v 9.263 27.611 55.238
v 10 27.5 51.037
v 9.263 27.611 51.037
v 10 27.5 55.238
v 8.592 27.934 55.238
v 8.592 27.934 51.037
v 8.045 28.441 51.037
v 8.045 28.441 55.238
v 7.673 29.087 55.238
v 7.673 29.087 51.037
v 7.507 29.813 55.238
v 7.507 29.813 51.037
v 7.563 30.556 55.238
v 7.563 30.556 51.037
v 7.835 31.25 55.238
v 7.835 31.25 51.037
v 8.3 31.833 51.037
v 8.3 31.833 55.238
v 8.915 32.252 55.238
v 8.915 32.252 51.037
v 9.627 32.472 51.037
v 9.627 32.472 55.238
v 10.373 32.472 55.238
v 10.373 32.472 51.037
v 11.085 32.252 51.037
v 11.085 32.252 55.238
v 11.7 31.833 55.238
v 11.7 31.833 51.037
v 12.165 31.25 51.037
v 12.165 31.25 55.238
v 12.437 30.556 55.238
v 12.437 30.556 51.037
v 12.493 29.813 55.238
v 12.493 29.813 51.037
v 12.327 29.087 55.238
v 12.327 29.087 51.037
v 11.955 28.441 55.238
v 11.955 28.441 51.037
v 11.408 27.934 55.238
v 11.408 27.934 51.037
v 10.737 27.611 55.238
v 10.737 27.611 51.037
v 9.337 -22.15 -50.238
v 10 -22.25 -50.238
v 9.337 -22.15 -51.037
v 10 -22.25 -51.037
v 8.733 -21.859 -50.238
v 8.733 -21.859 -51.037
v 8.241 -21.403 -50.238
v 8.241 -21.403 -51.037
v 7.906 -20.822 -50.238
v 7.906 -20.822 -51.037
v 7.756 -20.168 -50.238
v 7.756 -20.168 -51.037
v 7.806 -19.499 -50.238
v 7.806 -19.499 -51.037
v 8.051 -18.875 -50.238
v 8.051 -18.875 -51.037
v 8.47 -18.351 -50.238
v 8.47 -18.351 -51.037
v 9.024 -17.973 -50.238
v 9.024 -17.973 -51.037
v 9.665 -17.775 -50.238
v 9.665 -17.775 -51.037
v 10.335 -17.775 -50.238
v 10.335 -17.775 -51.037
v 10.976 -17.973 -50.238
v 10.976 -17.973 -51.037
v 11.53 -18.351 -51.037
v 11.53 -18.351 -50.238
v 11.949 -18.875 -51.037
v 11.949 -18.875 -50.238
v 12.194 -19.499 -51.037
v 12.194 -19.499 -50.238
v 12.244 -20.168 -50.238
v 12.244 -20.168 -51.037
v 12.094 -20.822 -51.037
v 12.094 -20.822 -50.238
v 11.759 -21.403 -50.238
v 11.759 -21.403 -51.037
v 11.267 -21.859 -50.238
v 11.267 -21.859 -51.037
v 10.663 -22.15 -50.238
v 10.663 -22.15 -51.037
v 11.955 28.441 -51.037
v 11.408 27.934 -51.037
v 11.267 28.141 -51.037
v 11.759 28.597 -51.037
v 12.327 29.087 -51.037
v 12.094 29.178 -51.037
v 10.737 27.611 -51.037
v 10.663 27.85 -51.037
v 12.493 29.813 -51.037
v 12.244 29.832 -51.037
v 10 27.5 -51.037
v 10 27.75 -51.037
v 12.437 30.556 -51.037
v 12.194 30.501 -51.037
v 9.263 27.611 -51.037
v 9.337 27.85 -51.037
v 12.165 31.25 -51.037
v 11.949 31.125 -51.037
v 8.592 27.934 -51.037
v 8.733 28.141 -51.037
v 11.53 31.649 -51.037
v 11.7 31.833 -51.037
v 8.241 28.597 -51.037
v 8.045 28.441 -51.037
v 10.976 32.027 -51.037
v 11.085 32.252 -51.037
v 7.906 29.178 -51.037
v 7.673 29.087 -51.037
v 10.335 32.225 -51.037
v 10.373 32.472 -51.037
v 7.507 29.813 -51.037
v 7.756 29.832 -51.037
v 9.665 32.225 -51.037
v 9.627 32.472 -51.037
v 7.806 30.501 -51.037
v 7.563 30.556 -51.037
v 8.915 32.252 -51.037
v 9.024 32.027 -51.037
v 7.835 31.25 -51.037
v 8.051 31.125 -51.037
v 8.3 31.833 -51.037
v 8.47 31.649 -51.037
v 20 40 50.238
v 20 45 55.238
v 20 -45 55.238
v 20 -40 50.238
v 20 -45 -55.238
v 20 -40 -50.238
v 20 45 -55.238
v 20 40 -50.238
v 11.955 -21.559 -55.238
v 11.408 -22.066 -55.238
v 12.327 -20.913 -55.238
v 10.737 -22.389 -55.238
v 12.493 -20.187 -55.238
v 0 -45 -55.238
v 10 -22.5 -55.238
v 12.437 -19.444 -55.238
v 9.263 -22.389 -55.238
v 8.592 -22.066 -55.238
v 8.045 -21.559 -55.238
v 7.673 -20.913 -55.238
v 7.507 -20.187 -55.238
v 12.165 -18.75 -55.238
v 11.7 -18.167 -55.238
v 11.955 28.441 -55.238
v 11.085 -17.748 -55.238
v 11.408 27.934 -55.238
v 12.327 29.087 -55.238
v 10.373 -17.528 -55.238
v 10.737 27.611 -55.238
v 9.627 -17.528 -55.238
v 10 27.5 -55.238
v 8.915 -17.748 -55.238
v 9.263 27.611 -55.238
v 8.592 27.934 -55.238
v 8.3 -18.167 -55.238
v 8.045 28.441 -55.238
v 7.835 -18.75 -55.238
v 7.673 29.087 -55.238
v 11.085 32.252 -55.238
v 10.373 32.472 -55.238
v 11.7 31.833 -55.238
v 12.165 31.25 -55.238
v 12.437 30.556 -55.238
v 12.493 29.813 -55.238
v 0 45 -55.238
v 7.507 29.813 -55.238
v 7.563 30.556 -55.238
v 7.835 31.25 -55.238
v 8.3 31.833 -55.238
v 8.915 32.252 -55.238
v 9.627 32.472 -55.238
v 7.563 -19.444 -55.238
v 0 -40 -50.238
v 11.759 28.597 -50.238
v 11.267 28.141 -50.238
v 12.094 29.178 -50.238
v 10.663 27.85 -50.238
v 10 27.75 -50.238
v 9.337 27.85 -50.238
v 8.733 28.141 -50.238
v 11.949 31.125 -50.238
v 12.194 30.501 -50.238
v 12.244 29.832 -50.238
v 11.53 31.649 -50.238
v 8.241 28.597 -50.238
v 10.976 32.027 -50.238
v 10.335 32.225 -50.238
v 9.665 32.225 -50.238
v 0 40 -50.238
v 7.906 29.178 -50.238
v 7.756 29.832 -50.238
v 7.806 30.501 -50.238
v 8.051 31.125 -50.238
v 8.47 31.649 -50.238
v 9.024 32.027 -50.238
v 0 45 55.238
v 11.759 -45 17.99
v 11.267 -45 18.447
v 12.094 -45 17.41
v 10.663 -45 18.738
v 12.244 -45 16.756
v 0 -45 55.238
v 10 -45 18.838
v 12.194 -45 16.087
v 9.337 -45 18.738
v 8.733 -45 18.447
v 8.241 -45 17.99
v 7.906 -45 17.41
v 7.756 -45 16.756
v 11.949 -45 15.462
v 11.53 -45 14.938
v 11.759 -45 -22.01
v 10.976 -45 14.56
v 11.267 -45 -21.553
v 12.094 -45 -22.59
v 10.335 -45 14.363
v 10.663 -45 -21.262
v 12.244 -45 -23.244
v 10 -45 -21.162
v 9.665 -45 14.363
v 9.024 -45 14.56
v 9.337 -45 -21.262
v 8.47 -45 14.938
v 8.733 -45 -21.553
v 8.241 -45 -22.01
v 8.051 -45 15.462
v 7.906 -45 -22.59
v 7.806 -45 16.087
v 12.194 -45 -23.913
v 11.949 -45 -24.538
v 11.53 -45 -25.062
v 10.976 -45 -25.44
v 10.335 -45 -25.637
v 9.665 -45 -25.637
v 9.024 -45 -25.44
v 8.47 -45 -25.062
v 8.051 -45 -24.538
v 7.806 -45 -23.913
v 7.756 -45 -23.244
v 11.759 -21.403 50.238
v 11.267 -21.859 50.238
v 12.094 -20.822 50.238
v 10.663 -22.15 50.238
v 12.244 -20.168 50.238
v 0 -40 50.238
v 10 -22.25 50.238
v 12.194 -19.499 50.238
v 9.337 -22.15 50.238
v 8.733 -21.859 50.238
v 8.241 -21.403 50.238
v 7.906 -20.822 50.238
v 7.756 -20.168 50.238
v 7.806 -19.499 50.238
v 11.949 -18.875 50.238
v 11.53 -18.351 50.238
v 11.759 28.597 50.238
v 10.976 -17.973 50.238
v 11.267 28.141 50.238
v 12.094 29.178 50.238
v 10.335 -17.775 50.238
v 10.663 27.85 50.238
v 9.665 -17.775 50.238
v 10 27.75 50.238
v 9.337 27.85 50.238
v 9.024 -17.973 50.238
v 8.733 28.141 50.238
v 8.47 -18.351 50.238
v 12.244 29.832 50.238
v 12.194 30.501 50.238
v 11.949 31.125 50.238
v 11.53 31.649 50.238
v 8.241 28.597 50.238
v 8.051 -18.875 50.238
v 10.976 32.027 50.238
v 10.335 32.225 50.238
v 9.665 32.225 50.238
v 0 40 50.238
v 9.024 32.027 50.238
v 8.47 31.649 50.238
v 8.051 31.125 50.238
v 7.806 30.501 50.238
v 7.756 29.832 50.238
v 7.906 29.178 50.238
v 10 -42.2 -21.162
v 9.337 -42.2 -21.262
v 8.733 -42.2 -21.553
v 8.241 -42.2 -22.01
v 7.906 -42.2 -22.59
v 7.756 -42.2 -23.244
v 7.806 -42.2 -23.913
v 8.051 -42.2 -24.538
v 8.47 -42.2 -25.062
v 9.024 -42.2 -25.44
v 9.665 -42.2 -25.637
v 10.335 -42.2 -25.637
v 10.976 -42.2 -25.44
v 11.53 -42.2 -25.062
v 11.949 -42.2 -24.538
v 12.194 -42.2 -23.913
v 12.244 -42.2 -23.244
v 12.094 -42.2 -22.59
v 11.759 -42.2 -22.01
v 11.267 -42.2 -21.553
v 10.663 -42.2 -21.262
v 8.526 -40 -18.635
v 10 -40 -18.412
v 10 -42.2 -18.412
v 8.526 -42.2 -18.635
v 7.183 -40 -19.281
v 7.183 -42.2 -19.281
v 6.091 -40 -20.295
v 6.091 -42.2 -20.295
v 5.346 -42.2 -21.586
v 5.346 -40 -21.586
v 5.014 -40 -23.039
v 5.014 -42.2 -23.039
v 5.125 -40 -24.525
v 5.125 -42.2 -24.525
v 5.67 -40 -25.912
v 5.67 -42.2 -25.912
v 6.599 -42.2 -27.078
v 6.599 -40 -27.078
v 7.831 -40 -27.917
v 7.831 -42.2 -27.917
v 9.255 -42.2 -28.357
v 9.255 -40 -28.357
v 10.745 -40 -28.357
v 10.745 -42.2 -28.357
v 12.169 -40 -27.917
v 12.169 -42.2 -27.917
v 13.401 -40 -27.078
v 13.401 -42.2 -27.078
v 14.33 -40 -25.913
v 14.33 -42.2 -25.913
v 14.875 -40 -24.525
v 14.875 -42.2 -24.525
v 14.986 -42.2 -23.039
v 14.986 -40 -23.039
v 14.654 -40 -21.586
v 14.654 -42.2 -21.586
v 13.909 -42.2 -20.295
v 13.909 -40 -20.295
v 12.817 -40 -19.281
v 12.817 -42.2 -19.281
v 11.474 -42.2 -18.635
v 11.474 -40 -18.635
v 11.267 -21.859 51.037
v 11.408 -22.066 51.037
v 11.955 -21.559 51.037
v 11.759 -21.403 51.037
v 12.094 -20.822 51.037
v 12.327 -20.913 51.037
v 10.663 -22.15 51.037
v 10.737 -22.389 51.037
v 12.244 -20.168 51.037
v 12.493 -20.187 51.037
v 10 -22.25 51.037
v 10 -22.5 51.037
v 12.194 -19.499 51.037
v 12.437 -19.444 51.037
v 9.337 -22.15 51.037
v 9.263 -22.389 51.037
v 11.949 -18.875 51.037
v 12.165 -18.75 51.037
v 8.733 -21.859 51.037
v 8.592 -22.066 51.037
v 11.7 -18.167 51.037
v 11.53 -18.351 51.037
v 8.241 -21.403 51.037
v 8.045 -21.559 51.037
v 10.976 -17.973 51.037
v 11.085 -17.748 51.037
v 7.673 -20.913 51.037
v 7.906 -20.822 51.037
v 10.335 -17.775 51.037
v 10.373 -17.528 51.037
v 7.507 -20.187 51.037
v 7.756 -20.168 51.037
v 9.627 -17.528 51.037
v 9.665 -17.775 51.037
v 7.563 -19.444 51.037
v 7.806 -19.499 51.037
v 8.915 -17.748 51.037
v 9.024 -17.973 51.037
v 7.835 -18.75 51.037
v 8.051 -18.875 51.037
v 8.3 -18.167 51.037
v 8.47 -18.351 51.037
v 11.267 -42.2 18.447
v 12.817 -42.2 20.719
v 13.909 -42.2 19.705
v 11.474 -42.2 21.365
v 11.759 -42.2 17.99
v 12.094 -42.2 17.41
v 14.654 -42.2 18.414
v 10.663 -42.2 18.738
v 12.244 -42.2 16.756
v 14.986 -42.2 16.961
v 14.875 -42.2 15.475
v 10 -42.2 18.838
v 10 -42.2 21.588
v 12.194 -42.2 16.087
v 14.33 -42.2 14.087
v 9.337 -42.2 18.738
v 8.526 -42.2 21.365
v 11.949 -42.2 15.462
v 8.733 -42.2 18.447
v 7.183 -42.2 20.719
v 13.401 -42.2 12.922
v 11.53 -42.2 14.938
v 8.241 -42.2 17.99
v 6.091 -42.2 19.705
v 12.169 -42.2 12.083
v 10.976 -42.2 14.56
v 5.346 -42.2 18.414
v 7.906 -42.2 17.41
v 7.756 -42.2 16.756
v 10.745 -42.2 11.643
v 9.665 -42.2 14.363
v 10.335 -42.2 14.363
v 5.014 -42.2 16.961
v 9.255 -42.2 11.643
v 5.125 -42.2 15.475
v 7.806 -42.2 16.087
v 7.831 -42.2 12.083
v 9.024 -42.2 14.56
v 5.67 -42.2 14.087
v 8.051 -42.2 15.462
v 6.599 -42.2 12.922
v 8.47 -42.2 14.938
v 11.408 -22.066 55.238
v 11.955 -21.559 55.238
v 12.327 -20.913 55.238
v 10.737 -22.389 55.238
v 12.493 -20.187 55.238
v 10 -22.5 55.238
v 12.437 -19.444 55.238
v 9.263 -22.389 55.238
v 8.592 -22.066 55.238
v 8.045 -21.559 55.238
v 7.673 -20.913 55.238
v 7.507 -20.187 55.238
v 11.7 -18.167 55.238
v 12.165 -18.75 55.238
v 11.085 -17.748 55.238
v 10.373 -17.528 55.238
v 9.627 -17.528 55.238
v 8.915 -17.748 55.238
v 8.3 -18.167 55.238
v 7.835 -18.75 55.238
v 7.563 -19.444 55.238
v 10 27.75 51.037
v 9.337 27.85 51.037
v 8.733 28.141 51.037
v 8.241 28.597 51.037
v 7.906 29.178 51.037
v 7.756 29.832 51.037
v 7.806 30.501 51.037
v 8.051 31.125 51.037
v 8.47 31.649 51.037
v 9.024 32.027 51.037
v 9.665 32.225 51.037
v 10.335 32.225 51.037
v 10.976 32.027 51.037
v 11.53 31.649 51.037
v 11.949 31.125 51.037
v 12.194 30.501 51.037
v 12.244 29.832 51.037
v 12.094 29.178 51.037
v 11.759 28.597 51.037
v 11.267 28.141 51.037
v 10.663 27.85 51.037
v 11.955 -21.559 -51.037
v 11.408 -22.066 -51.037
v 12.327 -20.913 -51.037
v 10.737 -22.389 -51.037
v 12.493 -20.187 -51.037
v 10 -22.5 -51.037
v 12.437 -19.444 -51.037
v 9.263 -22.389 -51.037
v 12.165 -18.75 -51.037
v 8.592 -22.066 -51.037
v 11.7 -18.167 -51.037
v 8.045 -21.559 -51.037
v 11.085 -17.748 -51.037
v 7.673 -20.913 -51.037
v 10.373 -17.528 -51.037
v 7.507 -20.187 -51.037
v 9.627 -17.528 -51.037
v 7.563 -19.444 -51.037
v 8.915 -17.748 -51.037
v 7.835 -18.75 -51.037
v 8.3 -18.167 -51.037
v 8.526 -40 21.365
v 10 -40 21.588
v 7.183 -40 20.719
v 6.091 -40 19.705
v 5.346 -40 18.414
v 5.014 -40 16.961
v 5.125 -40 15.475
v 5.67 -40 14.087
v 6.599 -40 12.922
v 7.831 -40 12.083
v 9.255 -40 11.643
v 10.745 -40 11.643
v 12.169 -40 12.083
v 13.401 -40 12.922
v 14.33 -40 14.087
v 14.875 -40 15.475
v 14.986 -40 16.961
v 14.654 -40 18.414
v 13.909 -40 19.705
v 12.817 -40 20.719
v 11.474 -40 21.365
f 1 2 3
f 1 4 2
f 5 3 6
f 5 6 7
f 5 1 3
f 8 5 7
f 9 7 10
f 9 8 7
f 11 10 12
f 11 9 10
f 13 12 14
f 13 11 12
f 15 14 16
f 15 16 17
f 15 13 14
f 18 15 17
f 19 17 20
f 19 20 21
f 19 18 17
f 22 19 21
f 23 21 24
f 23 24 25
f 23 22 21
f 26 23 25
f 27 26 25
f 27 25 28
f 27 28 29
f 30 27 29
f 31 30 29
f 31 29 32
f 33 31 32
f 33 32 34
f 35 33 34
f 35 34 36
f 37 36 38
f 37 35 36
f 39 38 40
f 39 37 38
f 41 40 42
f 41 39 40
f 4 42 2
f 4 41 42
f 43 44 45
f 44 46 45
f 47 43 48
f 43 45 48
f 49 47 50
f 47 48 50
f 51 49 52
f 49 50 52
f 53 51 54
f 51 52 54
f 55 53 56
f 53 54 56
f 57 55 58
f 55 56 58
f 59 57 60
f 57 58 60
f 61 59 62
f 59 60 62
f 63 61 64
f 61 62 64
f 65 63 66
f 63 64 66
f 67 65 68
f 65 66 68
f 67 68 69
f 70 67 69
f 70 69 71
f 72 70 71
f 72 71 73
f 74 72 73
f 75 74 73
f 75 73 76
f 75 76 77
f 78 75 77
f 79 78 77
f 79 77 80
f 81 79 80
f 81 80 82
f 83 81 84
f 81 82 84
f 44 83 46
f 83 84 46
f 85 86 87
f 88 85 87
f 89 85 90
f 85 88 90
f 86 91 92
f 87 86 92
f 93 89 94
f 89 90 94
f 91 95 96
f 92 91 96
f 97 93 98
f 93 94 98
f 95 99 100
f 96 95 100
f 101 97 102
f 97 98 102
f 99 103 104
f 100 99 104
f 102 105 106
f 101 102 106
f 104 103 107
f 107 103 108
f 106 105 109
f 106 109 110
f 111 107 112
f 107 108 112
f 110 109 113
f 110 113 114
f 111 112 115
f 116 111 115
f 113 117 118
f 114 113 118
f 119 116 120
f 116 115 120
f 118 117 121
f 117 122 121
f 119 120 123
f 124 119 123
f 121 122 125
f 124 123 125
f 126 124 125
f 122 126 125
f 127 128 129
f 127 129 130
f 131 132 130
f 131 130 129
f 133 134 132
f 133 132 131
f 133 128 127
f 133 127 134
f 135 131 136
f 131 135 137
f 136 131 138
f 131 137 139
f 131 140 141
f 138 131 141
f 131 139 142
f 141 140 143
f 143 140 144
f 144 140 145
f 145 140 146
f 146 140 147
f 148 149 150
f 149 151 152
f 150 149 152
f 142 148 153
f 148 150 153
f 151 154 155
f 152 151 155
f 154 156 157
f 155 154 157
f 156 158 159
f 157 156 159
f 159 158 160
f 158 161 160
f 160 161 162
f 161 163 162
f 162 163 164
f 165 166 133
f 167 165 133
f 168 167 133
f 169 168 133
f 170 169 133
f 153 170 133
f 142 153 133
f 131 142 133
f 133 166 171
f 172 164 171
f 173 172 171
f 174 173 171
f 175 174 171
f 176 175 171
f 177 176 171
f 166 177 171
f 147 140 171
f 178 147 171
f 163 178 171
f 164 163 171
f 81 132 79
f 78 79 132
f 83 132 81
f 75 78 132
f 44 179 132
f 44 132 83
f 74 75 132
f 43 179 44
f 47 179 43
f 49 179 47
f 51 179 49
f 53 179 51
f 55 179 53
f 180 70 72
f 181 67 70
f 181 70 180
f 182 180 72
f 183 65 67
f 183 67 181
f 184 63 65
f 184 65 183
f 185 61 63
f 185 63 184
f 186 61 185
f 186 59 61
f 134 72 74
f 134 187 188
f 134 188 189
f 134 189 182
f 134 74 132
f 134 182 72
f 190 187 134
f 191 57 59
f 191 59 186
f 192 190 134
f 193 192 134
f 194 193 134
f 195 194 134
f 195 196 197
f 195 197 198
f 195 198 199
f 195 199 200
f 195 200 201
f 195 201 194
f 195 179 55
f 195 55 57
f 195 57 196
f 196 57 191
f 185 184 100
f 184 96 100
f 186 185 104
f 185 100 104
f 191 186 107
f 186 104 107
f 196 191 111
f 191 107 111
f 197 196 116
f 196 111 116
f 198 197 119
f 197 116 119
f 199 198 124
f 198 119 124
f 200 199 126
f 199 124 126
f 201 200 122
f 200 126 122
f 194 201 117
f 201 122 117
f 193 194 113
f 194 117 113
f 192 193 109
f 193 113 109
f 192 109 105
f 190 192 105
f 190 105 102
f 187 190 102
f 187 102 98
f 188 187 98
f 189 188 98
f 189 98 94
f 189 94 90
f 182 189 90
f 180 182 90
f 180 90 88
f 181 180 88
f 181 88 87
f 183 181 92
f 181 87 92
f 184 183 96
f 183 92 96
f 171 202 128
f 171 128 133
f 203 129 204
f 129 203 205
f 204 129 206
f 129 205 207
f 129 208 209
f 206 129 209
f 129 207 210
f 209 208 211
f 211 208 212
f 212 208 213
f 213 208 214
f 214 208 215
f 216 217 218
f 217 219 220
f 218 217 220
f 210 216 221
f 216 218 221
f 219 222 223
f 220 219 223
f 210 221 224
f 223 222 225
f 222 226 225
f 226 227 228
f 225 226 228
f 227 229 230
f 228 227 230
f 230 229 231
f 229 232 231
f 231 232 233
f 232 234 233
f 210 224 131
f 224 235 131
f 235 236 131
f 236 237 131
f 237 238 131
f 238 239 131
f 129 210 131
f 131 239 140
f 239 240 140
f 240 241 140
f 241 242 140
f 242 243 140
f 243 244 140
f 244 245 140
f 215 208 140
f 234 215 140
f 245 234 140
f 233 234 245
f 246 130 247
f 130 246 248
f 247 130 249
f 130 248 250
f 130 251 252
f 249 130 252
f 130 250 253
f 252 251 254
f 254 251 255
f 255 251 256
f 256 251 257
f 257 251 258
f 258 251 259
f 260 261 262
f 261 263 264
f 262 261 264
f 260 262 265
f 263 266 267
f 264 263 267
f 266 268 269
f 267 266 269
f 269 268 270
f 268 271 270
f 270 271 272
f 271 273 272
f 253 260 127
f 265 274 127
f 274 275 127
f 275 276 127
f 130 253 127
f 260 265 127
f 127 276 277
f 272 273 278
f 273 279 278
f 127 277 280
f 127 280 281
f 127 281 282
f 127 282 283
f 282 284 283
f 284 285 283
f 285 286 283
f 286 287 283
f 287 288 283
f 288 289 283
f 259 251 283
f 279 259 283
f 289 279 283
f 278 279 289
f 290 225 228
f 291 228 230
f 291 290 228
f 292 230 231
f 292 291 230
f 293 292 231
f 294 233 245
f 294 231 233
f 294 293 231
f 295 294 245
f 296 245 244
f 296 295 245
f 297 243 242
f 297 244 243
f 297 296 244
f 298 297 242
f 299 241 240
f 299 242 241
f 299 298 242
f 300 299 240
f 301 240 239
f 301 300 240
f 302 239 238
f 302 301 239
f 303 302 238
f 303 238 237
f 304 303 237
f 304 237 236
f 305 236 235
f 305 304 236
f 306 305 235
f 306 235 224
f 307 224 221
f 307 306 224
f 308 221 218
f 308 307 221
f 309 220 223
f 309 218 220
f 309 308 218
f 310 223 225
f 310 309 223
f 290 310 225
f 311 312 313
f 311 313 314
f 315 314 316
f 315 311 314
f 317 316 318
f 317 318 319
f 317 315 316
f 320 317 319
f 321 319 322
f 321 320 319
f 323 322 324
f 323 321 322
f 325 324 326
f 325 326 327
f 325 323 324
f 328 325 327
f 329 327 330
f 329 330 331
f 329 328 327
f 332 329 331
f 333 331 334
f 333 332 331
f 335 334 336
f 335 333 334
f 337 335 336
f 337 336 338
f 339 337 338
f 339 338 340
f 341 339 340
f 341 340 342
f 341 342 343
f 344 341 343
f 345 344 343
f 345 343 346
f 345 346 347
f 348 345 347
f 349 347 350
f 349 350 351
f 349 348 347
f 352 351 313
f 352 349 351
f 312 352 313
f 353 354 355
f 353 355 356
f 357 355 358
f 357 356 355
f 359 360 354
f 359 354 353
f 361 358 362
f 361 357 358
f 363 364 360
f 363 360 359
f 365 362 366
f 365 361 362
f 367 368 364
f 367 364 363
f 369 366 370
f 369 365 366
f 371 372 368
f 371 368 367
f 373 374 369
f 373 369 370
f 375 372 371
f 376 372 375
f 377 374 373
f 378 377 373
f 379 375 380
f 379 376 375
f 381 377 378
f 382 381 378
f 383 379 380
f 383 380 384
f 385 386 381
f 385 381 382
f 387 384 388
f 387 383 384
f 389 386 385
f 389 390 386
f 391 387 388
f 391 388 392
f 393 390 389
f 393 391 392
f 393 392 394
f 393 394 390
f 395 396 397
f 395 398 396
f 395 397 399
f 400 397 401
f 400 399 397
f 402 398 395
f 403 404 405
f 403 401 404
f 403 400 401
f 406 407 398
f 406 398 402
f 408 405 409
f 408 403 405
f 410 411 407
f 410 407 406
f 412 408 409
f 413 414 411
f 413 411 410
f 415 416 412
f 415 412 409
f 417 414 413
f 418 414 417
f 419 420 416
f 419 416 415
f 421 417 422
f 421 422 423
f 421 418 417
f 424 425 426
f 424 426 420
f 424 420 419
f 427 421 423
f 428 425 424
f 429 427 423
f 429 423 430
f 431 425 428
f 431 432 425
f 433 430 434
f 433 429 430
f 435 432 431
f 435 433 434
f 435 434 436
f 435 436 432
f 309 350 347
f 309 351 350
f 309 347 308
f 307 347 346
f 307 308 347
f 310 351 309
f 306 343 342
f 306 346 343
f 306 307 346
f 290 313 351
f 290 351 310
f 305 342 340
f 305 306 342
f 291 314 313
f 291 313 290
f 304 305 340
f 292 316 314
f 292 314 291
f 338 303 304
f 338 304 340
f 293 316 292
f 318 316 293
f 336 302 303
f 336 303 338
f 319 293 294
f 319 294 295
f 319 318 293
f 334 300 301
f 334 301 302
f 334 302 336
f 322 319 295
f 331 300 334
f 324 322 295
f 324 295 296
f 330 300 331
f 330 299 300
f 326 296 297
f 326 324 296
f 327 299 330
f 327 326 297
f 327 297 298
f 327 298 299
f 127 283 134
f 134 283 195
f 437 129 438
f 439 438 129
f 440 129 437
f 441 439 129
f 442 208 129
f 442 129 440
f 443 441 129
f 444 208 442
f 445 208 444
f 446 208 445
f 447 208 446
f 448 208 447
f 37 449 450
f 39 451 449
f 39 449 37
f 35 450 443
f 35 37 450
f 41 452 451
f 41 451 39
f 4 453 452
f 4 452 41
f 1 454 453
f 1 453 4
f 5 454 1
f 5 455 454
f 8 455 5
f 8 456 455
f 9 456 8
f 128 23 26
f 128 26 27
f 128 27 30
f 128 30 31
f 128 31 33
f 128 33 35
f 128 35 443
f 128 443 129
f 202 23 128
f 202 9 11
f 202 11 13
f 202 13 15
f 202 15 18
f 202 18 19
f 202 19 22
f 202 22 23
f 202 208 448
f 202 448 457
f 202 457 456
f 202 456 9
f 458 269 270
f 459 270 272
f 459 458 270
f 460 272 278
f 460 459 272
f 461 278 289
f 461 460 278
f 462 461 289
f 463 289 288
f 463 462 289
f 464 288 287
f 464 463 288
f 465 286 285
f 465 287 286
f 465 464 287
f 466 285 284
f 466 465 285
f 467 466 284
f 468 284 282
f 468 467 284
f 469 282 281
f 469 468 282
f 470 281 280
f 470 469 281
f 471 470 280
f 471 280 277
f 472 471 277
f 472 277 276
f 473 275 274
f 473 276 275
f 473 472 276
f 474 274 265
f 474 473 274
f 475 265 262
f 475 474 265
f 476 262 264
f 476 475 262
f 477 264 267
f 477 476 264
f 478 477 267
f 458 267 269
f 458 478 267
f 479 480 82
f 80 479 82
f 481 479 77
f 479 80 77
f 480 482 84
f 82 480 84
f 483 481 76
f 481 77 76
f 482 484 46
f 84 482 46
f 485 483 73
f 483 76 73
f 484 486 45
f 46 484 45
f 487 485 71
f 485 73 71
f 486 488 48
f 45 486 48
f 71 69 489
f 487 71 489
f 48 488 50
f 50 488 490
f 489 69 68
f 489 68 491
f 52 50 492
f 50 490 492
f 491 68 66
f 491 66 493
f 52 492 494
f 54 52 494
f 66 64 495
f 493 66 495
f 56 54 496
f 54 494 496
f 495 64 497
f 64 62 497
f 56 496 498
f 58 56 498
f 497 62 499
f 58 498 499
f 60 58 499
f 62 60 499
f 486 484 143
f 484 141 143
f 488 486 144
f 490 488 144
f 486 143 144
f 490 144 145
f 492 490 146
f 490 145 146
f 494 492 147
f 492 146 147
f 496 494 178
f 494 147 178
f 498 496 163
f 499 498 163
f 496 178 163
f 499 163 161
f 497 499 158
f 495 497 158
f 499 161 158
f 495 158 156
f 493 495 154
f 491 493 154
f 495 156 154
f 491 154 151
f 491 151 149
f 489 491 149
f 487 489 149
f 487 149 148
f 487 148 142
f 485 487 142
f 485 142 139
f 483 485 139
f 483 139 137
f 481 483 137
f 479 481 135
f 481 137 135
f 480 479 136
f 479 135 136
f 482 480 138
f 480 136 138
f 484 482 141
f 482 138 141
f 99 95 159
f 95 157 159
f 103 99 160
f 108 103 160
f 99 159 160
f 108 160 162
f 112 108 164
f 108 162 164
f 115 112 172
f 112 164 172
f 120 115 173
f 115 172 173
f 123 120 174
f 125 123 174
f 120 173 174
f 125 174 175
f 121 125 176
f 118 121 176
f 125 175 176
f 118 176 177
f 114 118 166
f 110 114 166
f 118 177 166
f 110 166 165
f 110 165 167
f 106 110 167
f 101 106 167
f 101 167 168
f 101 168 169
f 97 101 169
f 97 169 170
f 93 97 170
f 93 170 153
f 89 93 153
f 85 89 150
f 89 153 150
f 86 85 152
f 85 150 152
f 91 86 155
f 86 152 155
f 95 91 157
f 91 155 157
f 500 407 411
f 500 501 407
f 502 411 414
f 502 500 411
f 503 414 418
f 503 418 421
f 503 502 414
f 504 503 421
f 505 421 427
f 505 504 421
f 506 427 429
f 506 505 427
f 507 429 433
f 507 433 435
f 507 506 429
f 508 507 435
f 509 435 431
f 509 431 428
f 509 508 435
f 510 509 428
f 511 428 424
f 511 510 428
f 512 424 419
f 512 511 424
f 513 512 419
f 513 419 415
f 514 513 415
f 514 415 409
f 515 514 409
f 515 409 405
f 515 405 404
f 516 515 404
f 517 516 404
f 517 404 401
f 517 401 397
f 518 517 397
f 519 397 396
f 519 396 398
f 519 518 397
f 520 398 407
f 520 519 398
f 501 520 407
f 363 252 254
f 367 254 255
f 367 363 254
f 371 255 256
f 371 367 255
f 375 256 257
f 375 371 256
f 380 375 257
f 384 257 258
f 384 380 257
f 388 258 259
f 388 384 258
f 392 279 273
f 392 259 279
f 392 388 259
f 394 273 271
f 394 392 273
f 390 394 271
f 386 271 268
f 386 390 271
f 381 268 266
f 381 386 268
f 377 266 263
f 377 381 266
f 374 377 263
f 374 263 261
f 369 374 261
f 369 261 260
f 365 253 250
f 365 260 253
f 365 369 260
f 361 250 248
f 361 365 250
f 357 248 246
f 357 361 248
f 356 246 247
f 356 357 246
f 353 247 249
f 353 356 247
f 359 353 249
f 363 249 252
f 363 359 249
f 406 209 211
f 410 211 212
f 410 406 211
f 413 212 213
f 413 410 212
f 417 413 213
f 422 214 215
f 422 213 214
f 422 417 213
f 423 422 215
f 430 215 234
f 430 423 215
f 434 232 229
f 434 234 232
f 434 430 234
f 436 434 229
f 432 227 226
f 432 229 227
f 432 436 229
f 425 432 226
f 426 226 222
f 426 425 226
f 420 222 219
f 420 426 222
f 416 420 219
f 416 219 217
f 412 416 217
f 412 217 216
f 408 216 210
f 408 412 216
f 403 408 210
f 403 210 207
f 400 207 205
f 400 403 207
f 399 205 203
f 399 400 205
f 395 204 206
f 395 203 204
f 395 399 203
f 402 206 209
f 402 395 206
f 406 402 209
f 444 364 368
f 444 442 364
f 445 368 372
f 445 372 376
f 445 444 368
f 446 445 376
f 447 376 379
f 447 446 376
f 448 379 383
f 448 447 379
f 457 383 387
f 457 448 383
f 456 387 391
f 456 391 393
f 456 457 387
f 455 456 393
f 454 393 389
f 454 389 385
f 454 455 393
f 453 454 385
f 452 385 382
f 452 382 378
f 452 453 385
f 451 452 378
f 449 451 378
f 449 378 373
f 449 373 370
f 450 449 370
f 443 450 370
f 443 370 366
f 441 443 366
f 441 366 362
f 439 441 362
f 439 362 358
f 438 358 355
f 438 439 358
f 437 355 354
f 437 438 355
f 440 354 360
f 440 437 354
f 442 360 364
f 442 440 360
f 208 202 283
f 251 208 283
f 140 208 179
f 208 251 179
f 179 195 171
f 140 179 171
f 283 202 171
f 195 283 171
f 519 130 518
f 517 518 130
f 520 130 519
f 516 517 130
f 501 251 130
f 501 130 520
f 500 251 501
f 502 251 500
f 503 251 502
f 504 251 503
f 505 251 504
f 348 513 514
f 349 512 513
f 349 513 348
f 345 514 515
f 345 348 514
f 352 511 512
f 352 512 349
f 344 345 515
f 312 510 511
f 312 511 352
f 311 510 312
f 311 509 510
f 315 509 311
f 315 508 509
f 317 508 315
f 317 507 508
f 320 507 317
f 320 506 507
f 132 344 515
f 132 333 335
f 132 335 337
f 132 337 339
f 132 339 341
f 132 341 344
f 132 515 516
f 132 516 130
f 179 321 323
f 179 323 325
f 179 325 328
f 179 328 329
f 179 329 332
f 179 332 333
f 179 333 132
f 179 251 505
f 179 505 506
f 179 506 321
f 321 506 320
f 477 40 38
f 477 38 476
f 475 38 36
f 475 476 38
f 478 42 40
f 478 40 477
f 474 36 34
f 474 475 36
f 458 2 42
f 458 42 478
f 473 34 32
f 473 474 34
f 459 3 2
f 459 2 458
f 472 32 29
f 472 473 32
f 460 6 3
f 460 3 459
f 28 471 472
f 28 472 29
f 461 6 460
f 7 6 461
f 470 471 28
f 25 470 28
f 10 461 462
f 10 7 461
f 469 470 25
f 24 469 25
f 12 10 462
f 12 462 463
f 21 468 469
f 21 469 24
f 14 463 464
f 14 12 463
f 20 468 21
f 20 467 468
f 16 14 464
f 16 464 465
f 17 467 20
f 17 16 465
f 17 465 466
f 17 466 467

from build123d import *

# Parameters (mm, degrees)
SKETCH1_W                              = 110.475
SKETCH1_H                              = 90
SKETCH1_W_2                            = 100.475
SKETCH1_H_2                            = 80
SKETCH1_W_3                            = 5
BOSS_EXTRUDE1_DEPTH                    = 20
CBORE_FOR_M4_SBHCS1_AT_2_COUNT         = 2
CBORE_FOR_M4_SBHCS1_AT_2_PITCH         = 40
CBORE_FOR_M5_HEX_HEAD_BOLT1_AT_2_COUNT = 2
CBORE_FOR_M5_HEX_HEAD_BOLT1_AT_2_PITCH = 50
SKETCH7_W                              = 5
SKETCH7_H                              = 80
CUT_EXTRUDE1_DEPTH                     = 30


with BuildPart() as part:
    # Sketch1 → Boss-Extrude1 (new body)
    # profile 1 of 2: a face of its own
    with BuildSketch(Plane(origin=(0, 0, 0), x_dir=(0, 0, -1), z_dir=(1, 0, 0))):
        Rectangle(SKETCH1_W, SKETCH1_H)
        Rectangle(SKETCH1_W_2, SKETCH1_H_2, mode=Mode.SUBTRACT)
    # profile 2 of 2: a face of its own
    with BuildSketch(Plane(origin=(0, 0, 0), x_dir=(0, 0, -1), z_dir=(1, 0, 0))):
        with Locations((22.7375, 0)):
            Rectangle(SKETCH1_W_3, SKETCH1_H_2)
    extrude(amount=BOSS_EXTRUDE1_DEPTH)

    # Sketch3 → CBORE for M4 SBHCS1 (revolve, cut)
    with BuildSketch(Plane(origin=(10, -40, -23.4125), x_dir=(0, 0, 1), z_dir=(1, 0, 0))):
        Polygon((0, 0), (0, 9.151936393), (2.25, 7.8), (2.25, 2.2), (5, 2.2), (5, 0), align=None)
    cbore_for_m4_sbhcs1 = revolve(axis=Axis((10, -33.65, -23.4125), (0, -1, 0)), mode=Mode.SUBTRACT)

    # CBORE for M4 SBHCS1 at 2: CBORE for M4 SBHCS1 ×2
    with Locations(*[(0, 0, i * CBORE_FOR_M4_SBHCS1_AT_2_PITCH) for i in range(1, CBORE_FOR_M4_SBHCS1_AT_2_COUNT)]):
        add(cbore_for_m4_sbhcs1, mode=Mode.SUBTRACT)

    # Sketch6 → CBORE for M5 Hex Head Bolt1 (revolve, cut)
    with BuildSketch(Plane(origin=(10, 30, 55.2375), x_dir=(0, -1, 0), z_dir=(1, 0, 0))):
        Polygon((0, 0), (0, 11.451936393), (2.25, 10.1), (2.25, 4.2), (2.5, 4.2), (2.5, 0), align=None)
    cbore_for_m5_hex_head_bolt1 = revolve(axis=Axis((10, 30, 61.5875), (0, 0, -1)), mode=Mode.SUBTRACT)

    # CBORE for M5 Hex Head Bolt1 at 2: CBORE for M5 Hex Head Bolt1 ×2
    with Locations(*[(0, -i * CBORE_FOR_M5_HEX_HEAD_BOLT1_AT_2_PITCH, 0) for i in range(1, CBORE_FOR_M5_HEX_HEAD_BOLT1_AT_2_COUNT)]):
        add(cbore_for_m5_hex_head_bolt1, mode=Mode.SUBTRACT)

    # Mirror1: CBORE for M5 Hex Head Bolt1 across plane
    add(cbore_for_m5_hex_head_bolt1.mirror(Plane.XY), mode=Mode.SUBTRACT)

    # Mirror1 copy 1 sketch → Mirror1 copy 1 (revolve, cut)
    with BuildSketch(Plane(origin=(10, -20, -55.2375), x_dir=(0, -1, 0), z_dir=(1, 0, 0))):
        Polygon((0, 0), (0, -11.451936393), (2.25, -10.1), (2.25, -4.2), (2.5, -4.2), (2.5, 0), align=None)
    revolve(axis=Axis((10, -20, -61.5875), (0, 0, -1)), mode=Mode.SUBTRACT)

    # Sketch7 → Cut-Extrude1 (cut)
    with BuildSketch(Plane.ZY):
        with Locations((-22.7375, 0)):
            Rectangle(SKETCH7_W, SKETCH7_H)
    extrude(amount=-CUT_EXTRUDE1_DEPTH, mode=Mode.SUBTRACT)


solid = part.part
